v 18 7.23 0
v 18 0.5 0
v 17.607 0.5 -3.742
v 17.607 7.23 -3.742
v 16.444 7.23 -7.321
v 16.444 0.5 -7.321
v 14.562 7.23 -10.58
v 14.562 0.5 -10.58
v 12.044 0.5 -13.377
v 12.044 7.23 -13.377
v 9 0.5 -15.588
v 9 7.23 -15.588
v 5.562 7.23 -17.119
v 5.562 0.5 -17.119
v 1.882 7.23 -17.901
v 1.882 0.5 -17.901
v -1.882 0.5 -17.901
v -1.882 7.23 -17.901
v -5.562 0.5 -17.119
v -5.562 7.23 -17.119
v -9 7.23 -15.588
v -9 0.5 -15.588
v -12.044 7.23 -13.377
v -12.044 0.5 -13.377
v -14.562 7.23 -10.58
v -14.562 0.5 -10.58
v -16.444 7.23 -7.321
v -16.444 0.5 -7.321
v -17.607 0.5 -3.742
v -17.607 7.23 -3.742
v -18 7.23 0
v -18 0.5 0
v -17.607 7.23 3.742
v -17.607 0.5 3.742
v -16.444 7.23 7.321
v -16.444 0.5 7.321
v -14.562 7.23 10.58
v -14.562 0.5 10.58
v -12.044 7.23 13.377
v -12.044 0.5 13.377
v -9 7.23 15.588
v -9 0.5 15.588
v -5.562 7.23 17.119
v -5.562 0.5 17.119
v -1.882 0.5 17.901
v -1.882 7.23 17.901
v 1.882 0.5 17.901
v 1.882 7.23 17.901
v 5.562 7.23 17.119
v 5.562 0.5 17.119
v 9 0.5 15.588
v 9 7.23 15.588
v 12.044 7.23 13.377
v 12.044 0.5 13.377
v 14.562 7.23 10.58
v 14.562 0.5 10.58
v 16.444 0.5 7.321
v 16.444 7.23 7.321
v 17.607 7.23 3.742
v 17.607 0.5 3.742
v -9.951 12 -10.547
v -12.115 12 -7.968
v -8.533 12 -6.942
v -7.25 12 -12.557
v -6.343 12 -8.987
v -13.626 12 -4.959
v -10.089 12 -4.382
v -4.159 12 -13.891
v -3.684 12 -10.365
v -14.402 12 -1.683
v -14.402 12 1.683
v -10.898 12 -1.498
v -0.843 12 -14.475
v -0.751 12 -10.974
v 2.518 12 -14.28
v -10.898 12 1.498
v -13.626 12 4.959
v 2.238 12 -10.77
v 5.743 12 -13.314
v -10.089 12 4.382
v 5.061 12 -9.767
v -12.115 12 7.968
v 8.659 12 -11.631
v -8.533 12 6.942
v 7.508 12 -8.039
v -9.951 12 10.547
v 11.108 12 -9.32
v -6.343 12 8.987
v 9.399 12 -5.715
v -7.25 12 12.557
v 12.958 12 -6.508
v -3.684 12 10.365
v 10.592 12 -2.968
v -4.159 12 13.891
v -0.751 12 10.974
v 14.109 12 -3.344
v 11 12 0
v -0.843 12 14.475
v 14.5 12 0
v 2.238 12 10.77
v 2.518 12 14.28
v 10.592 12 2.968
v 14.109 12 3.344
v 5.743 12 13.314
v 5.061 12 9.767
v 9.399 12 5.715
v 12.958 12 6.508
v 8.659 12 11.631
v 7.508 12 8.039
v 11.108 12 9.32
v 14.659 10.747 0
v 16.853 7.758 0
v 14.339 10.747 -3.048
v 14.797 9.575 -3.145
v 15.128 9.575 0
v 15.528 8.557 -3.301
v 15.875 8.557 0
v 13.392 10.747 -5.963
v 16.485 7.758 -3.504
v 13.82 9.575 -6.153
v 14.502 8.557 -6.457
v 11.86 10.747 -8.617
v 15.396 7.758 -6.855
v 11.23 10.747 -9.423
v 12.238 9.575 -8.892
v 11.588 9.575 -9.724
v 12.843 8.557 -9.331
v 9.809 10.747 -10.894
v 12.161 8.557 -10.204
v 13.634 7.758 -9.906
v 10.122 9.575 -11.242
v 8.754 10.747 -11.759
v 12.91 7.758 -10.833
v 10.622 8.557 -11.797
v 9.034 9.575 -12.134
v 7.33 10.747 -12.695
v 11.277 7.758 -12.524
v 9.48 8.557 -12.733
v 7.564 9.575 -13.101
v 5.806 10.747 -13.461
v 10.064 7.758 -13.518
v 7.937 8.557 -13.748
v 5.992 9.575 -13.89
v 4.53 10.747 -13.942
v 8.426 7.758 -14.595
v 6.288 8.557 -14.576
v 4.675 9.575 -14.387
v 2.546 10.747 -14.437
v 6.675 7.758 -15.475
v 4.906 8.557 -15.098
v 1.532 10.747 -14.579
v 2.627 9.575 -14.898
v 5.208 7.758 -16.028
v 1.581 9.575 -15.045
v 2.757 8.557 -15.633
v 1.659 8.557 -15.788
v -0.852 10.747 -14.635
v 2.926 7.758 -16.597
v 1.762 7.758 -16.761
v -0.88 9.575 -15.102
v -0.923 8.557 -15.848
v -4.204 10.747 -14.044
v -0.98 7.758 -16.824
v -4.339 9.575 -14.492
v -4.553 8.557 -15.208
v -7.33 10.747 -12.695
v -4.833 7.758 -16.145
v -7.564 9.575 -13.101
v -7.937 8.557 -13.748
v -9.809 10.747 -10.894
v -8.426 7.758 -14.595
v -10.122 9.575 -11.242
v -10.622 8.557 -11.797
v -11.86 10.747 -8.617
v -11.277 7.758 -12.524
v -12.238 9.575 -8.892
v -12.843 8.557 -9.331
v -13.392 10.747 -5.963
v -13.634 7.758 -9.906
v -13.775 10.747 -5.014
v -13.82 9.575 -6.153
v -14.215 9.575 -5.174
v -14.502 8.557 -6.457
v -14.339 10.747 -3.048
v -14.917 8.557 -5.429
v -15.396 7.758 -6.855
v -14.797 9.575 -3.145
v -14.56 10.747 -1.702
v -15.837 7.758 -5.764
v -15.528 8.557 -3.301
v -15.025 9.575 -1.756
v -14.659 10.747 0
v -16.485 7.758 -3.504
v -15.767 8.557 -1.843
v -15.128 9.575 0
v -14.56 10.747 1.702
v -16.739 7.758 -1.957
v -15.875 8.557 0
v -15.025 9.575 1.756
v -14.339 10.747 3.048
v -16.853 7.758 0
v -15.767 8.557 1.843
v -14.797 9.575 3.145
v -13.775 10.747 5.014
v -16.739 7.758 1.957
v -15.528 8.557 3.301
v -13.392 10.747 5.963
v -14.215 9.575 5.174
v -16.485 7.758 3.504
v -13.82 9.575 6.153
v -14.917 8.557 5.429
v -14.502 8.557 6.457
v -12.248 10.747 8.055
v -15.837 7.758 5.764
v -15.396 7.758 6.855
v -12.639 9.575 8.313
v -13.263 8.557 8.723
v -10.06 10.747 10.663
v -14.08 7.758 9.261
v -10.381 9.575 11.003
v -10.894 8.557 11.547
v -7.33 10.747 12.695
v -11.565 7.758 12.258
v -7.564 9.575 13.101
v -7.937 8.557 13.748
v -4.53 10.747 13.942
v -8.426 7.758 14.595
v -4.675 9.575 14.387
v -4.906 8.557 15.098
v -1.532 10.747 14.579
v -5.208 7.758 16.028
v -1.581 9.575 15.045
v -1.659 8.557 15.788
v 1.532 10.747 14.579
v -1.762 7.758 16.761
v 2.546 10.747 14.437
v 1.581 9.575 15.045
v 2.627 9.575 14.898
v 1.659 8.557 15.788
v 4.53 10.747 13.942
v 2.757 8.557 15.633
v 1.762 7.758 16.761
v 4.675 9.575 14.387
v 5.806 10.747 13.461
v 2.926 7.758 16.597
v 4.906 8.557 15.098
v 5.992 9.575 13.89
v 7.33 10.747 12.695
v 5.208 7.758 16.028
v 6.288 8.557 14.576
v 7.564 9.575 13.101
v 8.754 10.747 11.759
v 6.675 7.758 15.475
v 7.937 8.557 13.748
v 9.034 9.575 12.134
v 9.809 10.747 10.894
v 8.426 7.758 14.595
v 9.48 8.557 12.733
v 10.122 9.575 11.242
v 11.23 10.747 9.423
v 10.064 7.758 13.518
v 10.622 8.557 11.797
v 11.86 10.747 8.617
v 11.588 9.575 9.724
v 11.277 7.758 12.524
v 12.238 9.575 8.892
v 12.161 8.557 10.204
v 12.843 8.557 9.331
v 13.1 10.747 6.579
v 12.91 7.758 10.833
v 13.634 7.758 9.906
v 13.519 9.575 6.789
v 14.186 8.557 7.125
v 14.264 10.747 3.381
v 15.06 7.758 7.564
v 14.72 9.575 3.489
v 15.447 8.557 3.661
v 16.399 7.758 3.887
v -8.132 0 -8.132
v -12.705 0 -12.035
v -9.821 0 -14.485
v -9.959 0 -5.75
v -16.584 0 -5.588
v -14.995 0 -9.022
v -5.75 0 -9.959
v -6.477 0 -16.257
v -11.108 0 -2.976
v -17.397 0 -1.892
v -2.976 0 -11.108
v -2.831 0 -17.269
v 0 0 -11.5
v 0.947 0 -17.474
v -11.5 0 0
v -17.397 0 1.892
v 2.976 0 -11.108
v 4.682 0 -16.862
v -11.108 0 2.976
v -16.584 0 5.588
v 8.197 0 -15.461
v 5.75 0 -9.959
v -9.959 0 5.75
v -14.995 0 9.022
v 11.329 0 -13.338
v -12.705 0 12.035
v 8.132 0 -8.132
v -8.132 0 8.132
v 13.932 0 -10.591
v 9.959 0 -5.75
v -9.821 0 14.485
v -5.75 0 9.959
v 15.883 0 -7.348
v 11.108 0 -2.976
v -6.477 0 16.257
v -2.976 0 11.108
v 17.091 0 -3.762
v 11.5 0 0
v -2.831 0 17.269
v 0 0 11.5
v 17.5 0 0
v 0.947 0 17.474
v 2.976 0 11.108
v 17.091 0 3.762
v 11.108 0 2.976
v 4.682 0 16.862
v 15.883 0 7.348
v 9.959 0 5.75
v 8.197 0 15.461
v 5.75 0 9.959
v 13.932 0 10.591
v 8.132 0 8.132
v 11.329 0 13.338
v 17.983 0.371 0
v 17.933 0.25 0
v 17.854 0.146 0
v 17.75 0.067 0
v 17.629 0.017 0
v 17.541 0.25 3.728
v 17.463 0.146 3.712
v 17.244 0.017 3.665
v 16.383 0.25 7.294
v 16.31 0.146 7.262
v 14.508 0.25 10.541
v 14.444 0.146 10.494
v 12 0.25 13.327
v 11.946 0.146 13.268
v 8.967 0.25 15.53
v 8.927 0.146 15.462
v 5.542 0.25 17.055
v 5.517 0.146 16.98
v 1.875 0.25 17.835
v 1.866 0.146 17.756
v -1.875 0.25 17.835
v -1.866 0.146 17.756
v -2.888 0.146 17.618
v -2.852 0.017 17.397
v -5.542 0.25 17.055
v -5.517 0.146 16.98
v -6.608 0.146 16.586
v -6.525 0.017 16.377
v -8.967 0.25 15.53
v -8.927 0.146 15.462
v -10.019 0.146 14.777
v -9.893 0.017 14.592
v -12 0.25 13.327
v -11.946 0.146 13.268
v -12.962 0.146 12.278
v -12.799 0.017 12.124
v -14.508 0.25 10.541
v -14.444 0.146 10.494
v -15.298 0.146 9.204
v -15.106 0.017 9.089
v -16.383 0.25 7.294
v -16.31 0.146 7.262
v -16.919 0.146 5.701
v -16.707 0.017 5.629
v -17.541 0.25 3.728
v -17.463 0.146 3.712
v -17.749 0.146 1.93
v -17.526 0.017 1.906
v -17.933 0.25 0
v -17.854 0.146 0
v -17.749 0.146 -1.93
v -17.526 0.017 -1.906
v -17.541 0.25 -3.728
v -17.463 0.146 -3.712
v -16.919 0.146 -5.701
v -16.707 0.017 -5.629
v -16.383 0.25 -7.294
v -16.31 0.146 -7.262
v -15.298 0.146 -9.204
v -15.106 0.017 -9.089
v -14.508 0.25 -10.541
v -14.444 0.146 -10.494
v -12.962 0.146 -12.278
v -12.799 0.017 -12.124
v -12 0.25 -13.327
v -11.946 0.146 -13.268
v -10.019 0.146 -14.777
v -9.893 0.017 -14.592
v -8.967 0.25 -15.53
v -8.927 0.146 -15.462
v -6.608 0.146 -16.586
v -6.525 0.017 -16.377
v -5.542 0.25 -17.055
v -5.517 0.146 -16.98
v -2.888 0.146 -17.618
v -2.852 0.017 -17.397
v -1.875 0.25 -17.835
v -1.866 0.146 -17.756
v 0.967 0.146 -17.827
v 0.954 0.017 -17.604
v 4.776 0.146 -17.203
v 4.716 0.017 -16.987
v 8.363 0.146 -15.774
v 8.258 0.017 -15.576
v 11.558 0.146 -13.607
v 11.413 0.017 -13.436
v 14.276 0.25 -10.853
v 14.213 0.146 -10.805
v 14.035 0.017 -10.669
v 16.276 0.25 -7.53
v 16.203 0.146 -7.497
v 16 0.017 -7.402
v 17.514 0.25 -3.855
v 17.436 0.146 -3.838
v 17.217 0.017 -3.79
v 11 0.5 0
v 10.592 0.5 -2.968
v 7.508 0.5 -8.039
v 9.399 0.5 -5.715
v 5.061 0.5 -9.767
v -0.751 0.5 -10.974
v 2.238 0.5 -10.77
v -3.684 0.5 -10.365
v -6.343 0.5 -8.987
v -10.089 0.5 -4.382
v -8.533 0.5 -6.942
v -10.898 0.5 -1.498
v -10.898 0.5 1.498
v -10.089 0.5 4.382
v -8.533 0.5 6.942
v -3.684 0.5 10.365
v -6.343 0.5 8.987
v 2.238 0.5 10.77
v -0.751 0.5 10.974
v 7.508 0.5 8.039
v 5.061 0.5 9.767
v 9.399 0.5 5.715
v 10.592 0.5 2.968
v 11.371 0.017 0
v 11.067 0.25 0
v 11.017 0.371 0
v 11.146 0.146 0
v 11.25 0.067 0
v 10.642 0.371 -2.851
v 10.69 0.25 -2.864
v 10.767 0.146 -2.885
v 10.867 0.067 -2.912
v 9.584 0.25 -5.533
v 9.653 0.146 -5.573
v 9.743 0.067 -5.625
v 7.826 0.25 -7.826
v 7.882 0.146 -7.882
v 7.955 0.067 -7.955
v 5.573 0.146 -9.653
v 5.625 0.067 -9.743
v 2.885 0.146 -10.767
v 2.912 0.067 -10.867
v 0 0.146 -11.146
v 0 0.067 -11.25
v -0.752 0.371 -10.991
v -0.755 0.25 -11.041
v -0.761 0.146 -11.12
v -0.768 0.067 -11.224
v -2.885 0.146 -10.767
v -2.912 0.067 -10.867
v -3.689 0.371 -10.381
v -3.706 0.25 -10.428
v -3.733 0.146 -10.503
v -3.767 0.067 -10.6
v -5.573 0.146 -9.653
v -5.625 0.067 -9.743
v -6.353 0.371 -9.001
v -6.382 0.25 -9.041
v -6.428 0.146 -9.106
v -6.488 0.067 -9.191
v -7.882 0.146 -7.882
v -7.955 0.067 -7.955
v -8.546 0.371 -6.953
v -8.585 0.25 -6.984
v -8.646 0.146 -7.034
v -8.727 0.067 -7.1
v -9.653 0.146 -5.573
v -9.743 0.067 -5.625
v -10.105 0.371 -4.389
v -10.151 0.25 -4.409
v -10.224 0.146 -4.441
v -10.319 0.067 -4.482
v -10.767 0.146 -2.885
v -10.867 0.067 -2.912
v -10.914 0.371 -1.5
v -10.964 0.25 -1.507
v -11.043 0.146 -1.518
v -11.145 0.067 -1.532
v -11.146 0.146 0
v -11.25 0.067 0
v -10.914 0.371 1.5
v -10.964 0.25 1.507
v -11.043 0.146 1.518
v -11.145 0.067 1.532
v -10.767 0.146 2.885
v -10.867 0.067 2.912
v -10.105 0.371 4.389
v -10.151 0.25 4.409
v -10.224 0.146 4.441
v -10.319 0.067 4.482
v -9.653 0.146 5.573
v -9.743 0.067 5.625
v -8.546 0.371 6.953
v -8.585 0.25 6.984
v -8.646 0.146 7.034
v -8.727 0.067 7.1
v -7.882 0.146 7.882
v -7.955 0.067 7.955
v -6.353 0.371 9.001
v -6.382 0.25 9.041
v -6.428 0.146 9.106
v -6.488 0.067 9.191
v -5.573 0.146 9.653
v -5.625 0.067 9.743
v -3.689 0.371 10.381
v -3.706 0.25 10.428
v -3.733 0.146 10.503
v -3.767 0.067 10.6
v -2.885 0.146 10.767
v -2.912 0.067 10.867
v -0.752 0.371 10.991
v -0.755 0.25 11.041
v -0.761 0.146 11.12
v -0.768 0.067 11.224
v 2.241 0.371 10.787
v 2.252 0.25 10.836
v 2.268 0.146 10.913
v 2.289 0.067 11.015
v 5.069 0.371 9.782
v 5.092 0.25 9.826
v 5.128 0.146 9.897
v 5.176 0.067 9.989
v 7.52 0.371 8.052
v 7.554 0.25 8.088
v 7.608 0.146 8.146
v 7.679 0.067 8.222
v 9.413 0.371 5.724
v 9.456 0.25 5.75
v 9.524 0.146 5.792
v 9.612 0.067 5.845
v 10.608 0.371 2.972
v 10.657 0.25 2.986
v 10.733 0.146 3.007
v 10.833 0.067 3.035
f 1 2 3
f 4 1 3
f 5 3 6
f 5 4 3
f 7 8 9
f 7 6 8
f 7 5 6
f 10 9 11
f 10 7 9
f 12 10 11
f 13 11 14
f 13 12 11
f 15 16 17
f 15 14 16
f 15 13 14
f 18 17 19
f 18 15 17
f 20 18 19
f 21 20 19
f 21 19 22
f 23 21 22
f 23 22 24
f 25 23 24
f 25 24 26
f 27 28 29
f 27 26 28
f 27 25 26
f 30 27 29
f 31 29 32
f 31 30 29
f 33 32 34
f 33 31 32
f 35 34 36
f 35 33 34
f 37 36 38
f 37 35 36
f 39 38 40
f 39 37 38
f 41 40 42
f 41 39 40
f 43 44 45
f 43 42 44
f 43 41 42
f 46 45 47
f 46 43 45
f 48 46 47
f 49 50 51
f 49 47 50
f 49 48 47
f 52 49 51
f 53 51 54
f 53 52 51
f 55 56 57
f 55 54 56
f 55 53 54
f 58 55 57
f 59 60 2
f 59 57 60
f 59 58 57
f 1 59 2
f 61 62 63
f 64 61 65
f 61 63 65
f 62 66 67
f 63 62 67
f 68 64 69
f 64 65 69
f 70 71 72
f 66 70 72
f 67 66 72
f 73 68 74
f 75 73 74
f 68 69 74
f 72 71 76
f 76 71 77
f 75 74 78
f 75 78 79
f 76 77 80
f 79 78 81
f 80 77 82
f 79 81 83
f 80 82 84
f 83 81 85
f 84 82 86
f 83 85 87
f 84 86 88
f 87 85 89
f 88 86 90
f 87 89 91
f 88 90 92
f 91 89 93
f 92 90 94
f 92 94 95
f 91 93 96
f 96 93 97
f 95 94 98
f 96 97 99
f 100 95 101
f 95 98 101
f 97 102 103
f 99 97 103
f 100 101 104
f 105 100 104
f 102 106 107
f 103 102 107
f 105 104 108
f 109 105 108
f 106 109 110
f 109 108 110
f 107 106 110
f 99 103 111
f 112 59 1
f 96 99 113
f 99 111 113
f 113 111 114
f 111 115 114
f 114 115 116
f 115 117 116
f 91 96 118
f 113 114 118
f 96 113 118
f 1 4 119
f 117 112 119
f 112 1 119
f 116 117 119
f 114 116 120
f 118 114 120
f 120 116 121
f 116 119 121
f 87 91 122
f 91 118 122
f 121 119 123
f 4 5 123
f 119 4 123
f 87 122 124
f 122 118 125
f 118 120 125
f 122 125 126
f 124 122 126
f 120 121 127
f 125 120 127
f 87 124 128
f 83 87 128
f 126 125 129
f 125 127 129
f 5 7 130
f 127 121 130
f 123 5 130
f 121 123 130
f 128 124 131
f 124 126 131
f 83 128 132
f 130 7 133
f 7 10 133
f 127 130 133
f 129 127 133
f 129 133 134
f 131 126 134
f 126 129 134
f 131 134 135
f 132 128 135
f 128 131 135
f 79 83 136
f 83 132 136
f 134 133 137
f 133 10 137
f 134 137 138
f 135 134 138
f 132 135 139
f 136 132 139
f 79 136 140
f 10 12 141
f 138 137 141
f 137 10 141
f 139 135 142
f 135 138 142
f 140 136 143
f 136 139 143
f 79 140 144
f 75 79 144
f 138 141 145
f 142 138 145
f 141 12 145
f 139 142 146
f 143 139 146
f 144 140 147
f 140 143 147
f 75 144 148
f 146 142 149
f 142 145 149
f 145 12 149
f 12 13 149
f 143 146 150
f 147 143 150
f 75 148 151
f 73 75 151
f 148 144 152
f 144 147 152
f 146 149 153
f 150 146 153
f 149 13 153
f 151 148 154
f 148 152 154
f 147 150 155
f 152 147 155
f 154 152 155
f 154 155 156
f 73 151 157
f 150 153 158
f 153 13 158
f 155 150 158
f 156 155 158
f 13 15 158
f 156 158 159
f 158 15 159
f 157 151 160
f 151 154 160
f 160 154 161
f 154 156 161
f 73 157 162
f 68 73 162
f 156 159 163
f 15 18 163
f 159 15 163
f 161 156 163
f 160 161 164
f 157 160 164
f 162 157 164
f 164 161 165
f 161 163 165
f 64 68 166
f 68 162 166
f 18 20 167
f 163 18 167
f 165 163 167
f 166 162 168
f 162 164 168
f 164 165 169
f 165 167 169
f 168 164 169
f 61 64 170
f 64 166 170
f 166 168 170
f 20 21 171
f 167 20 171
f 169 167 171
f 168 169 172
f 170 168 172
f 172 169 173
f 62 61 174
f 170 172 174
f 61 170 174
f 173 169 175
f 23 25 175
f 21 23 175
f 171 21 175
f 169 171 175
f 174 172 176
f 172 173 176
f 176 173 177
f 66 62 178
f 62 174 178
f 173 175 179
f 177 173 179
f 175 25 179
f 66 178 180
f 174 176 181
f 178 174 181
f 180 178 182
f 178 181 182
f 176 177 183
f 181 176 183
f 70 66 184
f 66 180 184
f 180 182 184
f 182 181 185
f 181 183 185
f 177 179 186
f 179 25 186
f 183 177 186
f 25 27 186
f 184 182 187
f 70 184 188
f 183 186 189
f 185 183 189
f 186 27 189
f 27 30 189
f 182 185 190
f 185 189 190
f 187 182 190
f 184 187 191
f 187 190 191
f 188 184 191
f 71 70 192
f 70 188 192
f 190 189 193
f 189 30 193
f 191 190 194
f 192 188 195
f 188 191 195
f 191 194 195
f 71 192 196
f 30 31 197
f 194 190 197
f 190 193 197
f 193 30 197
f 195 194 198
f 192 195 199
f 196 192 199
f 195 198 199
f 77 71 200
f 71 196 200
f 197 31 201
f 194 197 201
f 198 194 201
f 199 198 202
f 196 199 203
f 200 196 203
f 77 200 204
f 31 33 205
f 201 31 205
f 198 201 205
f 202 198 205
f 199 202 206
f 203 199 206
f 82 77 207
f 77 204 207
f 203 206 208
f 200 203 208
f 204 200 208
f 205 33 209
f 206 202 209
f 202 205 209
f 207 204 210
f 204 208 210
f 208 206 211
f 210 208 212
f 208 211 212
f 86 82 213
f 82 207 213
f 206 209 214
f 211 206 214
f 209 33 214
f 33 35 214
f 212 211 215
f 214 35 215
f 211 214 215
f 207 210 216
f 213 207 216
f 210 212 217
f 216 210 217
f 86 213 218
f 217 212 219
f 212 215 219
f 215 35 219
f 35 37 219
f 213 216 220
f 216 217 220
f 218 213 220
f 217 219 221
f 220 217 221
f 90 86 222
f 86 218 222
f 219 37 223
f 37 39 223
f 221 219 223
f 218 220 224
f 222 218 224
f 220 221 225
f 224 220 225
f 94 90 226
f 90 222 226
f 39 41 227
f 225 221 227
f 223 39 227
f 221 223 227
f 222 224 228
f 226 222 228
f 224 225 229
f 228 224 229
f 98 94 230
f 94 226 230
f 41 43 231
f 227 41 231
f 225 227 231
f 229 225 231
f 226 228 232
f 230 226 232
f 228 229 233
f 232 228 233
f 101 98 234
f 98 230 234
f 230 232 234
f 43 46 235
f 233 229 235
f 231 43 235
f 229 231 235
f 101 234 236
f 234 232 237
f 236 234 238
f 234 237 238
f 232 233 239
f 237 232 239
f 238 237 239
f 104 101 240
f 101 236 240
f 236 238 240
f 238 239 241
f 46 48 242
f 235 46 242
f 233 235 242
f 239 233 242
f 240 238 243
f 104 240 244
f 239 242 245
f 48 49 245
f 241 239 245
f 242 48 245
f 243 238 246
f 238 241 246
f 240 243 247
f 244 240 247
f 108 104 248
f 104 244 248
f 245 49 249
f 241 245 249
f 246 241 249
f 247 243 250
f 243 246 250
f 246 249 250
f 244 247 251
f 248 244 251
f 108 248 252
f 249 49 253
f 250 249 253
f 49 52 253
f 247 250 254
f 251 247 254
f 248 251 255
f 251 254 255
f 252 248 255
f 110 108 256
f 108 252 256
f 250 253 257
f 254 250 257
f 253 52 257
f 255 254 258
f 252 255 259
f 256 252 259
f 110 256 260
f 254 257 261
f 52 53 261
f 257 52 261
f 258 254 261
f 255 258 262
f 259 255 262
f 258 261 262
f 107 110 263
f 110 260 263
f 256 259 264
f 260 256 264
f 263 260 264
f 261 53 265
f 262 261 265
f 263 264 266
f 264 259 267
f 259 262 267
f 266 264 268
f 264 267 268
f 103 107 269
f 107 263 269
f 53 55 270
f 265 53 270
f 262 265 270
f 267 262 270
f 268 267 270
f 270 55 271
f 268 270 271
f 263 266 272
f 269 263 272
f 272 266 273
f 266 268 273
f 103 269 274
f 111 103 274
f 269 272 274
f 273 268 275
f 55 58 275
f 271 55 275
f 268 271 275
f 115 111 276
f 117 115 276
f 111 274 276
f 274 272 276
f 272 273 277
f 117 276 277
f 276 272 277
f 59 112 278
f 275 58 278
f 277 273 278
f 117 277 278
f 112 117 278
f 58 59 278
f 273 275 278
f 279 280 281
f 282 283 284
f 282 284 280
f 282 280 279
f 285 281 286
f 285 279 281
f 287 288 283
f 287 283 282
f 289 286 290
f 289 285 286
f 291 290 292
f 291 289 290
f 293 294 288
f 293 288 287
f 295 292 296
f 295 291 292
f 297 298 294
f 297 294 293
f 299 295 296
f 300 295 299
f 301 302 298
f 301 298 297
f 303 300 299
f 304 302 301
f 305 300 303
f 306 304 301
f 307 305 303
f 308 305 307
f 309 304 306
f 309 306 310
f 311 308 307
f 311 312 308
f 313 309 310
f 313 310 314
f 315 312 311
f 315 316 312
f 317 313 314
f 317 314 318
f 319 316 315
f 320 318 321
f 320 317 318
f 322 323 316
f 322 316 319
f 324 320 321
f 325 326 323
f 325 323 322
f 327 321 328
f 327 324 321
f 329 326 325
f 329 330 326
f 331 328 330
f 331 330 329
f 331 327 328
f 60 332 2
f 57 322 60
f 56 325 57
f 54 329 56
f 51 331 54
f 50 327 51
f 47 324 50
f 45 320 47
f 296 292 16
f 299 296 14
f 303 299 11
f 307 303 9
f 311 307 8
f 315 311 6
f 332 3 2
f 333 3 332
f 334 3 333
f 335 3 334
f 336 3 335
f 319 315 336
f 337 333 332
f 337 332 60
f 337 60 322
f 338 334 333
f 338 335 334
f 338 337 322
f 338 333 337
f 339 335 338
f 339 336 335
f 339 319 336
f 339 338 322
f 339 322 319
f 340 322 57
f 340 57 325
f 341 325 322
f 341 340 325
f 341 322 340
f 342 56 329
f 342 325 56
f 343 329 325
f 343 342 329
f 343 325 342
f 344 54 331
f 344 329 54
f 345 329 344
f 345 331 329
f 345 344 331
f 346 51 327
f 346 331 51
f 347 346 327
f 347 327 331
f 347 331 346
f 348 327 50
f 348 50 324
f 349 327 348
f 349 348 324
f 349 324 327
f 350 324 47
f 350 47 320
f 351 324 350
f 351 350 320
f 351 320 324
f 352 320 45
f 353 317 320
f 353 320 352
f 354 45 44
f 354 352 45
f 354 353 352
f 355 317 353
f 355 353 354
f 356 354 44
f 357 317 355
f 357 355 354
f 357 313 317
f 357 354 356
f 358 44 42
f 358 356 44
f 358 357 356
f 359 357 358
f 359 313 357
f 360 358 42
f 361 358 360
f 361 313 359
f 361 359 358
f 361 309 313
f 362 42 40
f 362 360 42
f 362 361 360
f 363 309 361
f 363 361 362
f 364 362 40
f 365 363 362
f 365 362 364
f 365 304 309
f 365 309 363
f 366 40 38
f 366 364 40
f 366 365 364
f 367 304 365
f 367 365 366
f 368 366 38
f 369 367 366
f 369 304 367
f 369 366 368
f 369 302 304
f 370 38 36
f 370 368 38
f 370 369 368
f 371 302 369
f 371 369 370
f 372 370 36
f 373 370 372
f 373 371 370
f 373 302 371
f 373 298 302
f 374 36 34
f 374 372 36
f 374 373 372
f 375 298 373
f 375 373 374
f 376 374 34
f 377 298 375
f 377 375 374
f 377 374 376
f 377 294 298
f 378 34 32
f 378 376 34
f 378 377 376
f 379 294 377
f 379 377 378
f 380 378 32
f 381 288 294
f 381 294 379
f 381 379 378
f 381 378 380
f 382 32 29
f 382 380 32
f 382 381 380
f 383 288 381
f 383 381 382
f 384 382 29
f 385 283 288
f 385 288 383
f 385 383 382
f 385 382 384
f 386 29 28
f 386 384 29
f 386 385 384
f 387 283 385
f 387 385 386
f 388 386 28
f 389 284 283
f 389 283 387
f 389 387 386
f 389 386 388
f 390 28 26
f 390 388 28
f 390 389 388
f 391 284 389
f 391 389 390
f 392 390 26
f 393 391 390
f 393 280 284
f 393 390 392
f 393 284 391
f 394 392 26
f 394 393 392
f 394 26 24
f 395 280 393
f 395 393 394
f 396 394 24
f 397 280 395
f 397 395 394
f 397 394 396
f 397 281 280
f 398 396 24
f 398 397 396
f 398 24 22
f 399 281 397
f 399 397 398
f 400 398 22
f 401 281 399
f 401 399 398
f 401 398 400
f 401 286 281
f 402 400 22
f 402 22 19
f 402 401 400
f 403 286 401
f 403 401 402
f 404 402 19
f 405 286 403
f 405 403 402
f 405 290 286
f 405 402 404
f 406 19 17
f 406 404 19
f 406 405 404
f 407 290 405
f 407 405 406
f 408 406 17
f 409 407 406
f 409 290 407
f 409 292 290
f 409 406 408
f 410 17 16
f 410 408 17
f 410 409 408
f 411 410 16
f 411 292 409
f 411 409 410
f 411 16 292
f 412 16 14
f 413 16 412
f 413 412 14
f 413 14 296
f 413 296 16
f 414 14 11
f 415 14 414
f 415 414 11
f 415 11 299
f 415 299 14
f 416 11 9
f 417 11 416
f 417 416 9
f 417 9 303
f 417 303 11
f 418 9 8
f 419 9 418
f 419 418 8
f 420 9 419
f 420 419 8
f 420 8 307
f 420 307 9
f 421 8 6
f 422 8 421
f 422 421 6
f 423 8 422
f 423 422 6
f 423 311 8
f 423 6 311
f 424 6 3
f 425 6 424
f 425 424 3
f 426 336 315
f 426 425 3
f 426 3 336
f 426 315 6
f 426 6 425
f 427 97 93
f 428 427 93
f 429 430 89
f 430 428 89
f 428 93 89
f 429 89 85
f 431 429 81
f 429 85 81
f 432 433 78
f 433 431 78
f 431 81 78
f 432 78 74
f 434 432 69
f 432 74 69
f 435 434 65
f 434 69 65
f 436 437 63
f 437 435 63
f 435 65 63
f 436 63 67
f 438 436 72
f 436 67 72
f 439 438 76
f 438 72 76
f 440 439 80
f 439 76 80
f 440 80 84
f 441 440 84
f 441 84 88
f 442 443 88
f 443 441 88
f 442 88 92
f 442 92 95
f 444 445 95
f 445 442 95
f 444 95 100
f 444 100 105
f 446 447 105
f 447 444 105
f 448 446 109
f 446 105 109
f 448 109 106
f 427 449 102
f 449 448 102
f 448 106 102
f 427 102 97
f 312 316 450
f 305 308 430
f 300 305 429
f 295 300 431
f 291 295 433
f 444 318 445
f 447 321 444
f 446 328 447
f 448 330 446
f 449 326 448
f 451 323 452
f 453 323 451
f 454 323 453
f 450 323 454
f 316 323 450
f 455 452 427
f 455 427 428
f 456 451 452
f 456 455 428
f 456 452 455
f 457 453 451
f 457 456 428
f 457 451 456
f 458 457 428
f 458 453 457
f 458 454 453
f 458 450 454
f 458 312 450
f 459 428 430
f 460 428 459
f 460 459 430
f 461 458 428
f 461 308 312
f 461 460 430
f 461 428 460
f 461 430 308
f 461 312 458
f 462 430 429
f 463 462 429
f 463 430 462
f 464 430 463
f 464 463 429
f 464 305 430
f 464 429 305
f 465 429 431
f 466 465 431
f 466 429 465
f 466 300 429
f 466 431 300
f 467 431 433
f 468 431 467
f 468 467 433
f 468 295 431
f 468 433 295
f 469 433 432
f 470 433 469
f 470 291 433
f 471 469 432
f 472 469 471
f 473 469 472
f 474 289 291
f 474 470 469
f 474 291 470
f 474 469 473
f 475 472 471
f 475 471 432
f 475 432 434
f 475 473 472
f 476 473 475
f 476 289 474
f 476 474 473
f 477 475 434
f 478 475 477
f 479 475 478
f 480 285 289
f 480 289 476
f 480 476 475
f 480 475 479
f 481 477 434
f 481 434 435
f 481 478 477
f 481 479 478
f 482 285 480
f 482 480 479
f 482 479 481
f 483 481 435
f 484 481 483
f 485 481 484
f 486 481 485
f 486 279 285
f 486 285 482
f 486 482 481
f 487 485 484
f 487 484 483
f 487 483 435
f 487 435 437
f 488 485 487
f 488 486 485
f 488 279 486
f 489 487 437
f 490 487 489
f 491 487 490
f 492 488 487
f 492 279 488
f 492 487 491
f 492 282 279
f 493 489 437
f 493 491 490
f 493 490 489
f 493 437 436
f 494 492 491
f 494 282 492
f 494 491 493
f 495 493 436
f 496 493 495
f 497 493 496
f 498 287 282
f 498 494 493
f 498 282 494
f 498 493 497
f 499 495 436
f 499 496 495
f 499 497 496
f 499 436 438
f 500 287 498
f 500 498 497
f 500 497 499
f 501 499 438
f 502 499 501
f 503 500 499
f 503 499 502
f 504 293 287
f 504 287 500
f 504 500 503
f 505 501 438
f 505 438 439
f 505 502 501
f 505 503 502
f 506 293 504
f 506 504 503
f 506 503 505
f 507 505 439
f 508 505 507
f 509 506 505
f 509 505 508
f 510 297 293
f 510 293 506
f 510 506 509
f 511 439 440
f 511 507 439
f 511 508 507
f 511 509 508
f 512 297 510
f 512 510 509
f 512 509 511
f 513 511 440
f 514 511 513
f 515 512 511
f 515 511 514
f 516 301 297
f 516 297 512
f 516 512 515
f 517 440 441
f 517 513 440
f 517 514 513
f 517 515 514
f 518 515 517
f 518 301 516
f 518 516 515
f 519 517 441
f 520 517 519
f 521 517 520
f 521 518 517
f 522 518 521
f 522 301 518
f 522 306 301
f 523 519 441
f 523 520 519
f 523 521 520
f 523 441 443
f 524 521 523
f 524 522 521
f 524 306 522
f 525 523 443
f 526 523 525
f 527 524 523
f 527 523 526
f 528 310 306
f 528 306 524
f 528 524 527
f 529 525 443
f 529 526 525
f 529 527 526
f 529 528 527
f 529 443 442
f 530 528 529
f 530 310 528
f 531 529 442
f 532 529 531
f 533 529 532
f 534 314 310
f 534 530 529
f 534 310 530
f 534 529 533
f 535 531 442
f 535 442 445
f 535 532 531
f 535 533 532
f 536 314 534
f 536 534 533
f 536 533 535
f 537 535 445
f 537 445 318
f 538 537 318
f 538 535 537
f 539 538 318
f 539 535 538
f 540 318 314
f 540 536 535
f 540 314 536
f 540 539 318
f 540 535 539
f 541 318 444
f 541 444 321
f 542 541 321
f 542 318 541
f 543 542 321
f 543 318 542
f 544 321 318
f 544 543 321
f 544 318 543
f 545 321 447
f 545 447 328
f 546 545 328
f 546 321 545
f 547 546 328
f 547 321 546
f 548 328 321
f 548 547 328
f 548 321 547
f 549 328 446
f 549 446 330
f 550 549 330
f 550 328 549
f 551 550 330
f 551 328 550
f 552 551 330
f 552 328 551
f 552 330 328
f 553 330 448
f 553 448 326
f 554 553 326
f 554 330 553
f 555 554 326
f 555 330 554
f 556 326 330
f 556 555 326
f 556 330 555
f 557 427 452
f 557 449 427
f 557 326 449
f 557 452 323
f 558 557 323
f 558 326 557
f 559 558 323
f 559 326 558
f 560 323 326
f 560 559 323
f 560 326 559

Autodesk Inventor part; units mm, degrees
ref_plane "YZ Plane" through (0, 0, 0) normal (1, 0, 0) x (0, 1, 0)
ref_plane "XZ Plane" through (0, 0, 0) normal (0, 1, 0) x (-1, 0, 0)
ref_plane "XY Plane" through (0, 0, 0) normal (0, 0, 1) x (1, 0, 0)
sketch "Sketch1" plane through (0, 0, 0) normal (0, 0, 1) x (1, 0, 0)
  line L0 (0, 0) -> (18, 0)
  line L1 (18, 0) -> (18, 12)
  line L2 (18, 12) -> (0, 12)
  line L3 (0, 12) -> (0, 0)
  line L4 (0, 0) -> (11, 0)
  line L5 (11, 0) -> (11, 12)
  line L6 (11, 12) -> (0, 12)
  line L7 (0, 12) -> (0, 0)
  line L8 (18, 12) -> (19.5, 12)
  arc A0 (14.5, 12) -> (22.6054, 8.0813) centre (19.5, 12) ccw
  point P0 (18, 7.2303)
  dimension "d0" = 18
  dimension "d1" = 12
  dimension "d2" = 11
  dimension "d3" = 1.5
  dimension "d4" = 5
revolve "Revolution1" add sketch "Sketch1" angle 360 about axis through (0, 12, 0) along (0, -1, 0) contours L5 L2 A0 L1 L0
fillet "Fillet1" radius 0.5 2 edges at (-18, 0, 0) (-11, 0, 0)
properties part number "DriveWheelHalf"
